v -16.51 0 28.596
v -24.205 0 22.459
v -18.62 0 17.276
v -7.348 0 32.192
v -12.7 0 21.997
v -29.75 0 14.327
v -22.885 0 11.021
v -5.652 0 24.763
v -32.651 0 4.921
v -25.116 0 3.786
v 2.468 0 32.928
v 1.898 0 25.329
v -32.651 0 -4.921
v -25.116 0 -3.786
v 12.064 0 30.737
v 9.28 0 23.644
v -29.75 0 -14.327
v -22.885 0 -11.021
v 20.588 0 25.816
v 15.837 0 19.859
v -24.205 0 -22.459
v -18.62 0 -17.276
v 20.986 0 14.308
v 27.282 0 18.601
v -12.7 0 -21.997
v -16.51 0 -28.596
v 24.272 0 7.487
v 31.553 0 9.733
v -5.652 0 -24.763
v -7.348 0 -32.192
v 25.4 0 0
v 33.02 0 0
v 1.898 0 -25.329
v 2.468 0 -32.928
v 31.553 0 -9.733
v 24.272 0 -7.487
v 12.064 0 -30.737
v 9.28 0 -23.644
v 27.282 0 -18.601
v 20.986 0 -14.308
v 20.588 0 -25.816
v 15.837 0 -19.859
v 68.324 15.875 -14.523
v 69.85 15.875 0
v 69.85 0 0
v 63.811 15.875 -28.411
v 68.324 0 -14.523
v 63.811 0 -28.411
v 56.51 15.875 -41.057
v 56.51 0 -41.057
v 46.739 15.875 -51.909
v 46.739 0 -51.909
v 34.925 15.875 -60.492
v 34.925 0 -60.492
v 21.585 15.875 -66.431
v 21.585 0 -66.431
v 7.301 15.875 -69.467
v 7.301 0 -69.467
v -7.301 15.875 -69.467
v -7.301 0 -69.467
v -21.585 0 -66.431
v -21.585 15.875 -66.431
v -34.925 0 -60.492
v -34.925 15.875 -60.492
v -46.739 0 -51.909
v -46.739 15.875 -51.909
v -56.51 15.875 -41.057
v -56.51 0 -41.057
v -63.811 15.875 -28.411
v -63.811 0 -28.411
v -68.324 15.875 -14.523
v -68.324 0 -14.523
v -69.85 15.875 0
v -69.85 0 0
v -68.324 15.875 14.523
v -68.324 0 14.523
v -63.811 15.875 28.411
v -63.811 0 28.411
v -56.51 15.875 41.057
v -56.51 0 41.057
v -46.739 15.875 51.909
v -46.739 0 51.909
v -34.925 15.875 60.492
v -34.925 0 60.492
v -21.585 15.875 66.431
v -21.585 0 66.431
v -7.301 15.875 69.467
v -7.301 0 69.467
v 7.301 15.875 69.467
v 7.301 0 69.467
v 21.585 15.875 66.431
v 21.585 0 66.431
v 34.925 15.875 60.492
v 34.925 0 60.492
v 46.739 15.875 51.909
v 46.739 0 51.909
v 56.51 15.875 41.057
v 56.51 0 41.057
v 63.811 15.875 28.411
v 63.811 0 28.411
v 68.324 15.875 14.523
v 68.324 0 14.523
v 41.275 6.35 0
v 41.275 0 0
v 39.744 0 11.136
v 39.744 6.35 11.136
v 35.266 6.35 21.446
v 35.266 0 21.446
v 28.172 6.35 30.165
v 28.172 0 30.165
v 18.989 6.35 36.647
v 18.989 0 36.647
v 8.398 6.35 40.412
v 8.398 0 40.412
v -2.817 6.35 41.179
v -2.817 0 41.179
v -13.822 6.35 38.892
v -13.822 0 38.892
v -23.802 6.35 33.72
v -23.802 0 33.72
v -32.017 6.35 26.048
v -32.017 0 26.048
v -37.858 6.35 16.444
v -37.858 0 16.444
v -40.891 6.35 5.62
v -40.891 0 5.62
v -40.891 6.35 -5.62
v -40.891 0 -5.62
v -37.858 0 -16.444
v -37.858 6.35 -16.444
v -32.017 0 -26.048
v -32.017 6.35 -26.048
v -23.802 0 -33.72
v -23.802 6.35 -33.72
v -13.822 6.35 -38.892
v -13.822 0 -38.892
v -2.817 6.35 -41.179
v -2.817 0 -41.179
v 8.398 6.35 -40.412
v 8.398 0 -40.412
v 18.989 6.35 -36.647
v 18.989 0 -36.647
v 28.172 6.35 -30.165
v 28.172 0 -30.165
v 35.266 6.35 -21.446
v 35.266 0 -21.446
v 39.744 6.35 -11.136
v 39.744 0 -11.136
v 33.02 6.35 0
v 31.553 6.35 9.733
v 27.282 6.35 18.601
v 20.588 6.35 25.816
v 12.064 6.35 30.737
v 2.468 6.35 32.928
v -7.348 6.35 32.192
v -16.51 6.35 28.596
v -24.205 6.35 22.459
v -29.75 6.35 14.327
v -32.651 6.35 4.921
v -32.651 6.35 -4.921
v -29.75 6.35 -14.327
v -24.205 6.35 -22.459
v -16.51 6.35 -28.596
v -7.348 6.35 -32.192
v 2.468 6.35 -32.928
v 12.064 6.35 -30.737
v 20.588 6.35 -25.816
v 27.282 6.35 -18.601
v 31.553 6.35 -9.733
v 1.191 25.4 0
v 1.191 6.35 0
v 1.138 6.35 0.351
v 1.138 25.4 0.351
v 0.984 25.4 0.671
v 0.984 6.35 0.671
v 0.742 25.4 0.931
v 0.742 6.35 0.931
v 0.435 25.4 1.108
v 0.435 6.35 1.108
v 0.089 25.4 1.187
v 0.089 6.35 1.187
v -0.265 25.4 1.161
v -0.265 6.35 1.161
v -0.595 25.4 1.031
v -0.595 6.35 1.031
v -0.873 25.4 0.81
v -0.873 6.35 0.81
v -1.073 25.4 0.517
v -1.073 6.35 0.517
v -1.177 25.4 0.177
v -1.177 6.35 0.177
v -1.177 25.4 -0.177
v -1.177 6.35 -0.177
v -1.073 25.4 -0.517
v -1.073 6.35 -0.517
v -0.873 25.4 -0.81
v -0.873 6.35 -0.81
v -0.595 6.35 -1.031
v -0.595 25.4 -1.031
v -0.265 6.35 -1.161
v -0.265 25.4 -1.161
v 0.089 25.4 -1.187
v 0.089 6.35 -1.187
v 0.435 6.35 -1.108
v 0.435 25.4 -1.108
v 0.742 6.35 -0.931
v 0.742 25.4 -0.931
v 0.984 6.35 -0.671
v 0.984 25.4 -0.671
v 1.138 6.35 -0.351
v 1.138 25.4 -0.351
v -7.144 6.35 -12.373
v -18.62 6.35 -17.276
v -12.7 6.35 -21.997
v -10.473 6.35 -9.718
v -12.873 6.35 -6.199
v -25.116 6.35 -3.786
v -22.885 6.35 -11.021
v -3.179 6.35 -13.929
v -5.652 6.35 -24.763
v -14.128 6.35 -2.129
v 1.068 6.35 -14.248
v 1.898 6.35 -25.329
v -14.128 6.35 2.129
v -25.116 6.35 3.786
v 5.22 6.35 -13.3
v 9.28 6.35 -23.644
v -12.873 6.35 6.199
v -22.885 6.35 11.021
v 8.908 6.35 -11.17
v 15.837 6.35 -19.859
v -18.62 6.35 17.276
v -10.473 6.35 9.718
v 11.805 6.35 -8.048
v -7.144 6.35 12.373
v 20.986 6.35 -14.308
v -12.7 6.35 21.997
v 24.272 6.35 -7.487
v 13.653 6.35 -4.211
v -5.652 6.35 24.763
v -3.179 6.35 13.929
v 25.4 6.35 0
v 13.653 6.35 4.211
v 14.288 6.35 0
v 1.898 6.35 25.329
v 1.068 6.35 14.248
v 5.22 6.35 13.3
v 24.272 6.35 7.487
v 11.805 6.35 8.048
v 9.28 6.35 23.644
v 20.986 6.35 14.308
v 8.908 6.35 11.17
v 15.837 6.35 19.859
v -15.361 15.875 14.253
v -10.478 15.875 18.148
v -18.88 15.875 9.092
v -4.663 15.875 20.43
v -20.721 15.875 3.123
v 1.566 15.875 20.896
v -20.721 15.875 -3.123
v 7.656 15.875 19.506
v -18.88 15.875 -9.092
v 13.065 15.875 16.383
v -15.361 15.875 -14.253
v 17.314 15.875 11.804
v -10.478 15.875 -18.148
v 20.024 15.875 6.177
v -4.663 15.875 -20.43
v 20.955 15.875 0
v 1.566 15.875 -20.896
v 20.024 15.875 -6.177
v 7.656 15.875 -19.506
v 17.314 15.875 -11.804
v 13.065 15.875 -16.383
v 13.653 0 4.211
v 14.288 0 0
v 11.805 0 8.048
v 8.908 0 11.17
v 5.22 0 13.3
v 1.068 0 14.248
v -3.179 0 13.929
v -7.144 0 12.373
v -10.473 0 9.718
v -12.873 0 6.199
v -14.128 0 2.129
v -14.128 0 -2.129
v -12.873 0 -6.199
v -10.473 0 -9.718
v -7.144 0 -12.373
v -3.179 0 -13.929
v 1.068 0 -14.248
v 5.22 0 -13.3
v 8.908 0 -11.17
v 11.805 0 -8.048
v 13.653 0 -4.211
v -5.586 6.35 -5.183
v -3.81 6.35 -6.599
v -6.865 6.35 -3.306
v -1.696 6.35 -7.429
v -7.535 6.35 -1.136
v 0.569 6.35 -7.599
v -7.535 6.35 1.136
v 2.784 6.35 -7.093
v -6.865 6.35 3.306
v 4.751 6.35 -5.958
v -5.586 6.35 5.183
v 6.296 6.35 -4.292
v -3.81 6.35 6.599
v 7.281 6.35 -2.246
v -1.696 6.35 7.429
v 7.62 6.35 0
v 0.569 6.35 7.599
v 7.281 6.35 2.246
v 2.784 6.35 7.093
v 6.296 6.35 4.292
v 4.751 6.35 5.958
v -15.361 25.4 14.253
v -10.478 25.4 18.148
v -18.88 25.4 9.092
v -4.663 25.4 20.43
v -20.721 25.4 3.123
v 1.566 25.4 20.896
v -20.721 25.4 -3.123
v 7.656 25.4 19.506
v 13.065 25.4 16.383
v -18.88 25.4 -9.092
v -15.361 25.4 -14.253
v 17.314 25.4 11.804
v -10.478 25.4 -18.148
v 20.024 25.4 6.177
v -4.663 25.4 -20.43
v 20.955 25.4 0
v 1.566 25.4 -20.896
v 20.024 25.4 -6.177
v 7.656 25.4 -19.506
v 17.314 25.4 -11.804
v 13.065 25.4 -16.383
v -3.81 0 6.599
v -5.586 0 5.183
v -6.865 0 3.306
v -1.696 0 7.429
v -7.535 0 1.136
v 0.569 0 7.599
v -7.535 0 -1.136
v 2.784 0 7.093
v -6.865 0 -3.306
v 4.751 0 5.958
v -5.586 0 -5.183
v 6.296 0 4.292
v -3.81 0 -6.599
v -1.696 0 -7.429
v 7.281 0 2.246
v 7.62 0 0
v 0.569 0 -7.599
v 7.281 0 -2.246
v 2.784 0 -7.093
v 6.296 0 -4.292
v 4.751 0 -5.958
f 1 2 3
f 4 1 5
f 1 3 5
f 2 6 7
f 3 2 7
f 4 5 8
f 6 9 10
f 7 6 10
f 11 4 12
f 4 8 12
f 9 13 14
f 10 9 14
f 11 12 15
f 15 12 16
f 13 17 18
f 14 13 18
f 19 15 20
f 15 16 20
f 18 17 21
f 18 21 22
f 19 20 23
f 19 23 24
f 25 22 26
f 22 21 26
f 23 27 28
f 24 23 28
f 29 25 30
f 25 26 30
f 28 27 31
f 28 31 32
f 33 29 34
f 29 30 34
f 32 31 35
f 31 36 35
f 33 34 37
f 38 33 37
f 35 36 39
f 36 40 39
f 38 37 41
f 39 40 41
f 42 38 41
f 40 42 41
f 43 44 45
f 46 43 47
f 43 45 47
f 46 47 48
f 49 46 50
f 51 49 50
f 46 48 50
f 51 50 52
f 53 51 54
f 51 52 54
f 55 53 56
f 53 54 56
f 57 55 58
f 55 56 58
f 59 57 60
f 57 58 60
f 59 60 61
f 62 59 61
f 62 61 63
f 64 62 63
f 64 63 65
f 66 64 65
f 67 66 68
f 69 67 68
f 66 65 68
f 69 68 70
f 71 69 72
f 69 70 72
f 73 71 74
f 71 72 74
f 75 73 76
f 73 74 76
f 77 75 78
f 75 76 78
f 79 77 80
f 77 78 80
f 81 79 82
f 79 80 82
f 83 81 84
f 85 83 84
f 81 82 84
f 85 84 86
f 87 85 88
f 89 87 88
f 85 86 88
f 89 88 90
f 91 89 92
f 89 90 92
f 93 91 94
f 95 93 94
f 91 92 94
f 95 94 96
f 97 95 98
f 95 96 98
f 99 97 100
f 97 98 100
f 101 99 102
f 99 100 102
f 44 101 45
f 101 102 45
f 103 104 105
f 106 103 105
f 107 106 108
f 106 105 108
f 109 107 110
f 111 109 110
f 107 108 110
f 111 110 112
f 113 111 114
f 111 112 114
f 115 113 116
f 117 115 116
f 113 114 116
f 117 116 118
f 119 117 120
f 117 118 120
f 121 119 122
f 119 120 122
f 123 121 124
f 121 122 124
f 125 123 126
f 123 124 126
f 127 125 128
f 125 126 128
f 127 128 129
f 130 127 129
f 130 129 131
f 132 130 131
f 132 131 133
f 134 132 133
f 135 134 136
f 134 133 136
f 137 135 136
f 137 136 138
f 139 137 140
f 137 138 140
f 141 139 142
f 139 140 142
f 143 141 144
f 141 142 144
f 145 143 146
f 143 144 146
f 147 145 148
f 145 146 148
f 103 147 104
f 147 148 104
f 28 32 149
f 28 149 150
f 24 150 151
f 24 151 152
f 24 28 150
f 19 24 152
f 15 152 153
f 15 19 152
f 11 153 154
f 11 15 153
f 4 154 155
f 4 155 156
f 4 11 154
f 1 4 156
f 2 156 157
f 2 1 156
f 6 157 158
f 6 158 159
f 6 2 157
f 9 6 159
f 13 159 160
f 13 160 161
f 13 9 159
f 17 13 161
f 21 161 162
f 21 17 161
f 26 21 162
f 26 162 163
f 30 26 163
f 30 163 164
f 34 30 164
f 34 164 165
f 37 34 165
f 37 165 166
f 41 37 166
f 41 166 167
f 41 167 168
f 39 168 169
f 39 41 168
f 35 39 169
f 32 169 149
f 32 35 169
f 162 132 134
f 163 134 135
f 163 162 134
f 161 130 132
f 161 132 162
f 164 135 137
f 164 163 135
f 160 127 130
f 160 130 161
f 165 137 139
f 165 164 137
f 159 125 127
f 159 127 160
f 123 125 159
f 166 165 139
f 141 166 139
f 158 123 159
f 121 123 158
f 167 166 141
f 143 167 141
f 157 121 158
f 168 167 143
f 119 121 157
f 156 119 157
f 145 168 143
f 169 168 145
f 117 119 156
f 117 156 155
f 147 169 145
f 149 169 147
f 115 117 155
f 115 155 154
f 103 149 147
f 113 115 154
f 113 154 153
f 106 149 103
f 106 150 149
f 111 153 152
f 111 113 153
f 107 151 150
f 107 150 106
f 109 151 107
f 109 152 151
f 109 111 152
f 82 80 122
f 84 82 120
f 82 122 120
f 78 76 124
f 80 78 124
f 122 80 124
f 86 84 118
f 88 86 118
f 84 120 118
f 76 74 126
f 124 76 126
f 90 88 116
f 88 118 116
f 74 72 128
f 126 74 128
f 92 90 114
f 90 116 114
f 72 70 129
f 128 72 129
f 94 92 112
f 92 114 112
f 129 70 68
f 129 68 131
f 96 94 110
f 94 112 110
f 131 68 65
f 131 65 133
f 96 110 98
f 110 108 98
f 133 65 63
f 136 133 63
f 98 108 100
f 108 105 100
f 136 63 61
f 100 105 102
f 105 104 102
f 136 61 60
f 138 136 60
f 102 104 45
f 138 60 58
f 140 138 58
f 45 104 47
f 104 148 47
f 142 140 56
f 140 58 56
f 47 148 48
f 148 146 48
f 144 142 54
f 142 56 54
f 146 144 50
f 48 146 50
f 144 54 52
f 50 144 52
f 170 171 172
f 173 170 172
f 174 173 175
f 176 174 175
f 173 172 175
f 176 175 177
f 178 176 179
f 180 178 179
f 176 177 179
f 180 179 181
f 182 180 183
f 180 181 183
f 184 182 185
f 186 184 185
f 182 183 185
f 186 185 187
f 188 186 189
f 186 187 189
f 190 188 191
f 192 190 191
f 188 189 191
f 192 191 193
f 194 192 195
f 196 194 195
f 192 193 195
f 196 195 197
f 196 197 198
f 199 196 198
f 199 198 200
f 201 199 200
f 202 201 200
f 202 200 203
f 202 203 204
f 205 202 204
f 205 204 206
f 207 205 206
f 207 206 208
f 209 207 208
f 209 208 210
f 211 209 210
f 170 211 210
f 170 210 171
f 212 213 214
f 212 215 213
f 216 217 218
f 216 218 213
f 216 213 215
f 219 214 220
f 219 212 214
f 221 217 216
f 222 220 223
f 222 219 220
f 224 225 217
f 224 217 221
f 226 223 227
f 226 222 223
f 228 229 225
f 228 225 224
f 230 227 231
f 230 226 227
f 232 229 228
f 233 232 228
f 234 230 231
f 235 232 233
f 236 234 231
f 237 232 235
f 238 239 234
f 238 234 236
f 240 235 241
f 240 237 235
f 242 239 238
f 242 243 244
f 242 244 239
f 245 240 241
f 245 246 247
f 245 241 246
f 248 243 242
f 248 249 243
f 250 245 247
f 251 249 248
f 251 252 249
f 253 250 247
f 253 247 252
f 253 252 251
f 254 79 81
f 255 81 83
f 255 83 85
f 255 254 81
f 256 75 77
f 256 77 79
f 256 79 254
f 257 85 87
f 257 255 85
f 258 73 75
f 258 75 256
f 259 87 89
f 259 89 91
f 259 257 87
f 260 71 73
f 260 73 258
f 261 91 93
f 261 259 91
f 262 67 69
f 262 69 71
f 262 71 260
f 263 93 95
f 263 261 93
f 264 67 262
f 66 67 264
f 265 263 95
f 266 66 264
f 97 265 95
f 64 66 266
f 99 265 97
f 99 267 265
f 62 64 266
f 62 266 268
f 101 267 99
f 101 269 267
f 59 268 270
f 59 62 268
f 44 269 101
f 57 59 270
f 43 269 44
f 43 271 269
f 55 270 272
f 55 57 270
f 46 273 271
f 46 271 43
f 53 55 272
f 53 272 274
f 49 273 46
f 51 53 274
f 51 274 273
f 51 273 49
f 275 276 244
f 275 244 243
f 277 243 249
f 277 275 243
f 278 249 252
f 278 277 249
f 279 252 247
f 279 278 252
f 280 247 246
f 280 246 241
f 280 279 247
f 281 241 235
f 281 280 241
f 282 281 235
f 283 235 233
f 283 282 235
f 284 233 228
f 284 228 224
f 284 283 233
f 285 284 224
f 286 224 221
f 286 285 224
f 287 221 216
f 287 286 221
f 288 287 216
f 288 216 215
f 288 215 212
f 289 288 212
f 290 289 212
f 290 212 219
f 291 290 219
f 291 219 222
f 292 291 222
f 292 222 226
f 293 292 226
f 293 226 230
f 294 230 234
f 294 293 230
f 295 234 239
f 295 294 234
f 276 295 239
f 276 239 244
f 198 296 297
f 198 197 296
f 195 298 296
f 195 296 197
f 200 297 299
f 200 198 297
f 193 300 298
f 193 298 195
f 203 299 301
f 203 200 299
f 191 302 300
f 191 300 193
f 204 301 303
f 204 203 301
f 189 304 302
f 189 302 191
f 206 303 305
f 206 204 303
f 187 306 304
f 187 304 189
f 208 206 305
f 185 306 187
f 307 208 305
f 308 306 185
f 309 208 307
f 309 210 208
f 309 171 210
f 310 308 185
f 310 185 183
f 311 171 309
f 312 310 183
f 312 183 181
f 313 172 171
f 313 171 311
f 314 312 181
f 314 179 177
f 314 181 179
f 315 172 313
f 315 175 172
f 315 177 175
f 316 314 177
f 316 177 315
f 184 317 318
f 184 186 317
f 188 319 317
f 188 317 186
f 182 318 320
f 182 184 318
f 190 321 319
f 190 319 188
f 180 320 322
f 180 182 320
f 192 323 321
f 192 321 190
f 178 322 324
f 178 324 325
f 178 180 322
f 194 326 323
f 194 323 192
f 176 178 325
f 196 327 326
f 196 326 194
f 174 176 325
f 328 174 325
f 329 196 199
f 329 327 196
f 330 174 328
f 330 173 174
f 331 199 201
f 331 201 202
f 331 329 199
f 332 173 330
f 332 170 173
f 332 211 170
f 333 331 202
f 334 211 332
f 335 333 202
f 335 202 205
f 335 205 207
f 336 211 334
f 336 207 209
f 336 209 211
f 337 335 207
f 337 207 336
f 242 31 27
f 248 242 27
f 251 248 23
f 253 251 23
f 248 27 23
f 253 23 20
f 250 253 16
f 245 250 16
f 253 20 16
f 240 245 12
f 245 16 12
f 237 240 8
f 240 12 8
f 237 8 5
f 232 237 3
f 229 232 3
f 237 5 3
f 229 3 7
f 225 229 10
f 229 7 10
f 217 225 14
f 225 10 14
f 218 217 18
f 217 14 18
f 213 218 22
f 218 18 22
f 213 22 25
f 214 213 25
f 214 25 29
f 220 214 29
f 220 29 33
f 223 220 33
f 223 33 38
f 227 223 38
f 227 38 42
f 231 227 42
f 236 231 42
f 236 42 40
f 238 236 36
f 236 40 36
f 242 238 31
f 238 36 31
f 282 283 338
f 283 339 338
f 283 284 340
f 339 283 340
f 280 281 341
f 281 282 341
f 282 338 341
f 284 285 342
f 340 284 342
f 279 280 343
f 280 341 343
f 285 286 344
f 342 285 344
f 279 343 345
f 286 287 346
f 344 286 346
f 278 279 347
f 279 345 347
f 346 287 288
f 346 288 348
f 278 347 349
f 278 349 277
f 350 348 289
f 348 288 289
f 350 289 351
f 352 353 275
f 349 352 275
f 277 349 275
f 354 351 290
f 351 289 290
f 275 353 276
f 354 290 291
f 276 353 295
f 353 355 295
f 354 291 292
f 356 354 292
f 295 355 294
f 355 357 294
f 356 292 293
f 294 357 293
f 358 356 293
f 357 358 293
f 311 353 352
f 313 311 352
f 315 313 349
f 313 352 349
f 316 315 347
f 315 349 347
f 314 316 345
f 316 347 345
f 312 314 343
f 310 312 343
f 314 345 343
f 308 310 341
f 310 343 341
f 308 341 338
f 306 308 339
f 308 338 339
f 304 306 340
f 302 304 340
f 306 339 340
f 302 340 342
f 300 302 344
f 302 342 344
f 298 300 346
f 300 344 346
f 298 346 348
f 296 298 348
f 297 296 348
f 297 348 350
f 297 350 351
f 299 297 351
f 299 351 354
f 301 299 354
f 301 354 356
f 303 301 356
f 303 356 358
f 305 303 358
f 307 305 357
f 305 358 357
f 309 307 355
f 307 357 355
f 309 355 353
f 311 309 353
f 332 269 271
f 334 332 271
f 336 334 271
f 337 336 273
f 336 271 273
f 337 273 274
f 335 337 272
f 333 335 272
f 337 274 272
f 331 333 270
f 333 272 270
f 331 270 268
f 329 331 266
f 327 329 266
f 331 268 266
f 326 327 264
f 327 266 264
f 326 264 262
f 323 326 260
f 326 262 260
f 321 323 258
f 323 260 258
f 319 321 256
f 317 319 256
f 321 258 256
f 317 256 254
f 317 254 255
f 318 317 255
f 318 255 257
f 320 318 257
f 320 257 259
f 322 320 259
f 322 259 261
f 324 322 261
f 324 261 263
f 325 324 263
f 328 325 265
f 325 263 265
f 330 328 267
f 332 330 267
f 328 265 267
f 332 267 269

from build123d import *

# Parameters (mm, degrees)
SKETCH1_R           = 69.85
BOSS_EXTRUDE1_DEPTH = 15.875
SKETCH2_R           = 20.955
BOSS_EXTRUDE2_DEPTH = 9.525
SKETCH13_R          = 41.275
SKETCH13_R_2        = 33.02
SKETCH13_R_3        = 25.4
SKETCH13_R_4        = 14.2875
SKETCH13_R_5        = 7.62
CUT_EXTRUDE10_DEPTH = 6.35
SKETCH14_R          = 1.190625
CUT_EXTRUDE11_DEPTH = 20.05


with BuildPart() as part:
    # Sketch1 → Boss-Extrude1 (new body)
    with BuildSketch(Plane(origin=(0, 0, 0), x_dir=(1, 0, 0), z_dir=(0, 1, 0))):
        Circle(SKETCH1_R)
    extrude(amount=BOSS_EXTRUDE1_DEPTH)

    # Sketch2 → Boss-Extrude2 (add)
    with BuildSketch(Plane(origin=(0, 15.875, 0), x_dir=(1, 0, 0), z_dir=(0, 1, 0))):
        Circle(SKETCH2_R)
    extrude(amount=BOSS_EXTRUDE2_DEPTH)

    # Sketch13 → Cut-Extrude10 (cut)
    with BuildSketch(Plane.XZ):
        Circle(SKETCH13_R)
        Circle(SKETCH13_R_2, mode=Mode.SUBTRACT)
        Circle(SKETCH13_R_3)
        Circle(SKETCH13_R_4, mode=Mode.SUBTRACT)
        Circle(SKETCH13_R_5)
    extrude(amount=-CUT_EXTRUDE10_DEPTH, mode=Mode.SUBTRACT)

    # Sketch14 → Cut-Extrude11 (cut, through all)
    with BuildSketch(Plane.XZ.offset(-6.35)):
        Circle(SKETCH14_R)
    extrude(amount=-CUT_EXTRUDE11_DEPTH, mode=Mode.SUBTRACT)


solid = part.part
